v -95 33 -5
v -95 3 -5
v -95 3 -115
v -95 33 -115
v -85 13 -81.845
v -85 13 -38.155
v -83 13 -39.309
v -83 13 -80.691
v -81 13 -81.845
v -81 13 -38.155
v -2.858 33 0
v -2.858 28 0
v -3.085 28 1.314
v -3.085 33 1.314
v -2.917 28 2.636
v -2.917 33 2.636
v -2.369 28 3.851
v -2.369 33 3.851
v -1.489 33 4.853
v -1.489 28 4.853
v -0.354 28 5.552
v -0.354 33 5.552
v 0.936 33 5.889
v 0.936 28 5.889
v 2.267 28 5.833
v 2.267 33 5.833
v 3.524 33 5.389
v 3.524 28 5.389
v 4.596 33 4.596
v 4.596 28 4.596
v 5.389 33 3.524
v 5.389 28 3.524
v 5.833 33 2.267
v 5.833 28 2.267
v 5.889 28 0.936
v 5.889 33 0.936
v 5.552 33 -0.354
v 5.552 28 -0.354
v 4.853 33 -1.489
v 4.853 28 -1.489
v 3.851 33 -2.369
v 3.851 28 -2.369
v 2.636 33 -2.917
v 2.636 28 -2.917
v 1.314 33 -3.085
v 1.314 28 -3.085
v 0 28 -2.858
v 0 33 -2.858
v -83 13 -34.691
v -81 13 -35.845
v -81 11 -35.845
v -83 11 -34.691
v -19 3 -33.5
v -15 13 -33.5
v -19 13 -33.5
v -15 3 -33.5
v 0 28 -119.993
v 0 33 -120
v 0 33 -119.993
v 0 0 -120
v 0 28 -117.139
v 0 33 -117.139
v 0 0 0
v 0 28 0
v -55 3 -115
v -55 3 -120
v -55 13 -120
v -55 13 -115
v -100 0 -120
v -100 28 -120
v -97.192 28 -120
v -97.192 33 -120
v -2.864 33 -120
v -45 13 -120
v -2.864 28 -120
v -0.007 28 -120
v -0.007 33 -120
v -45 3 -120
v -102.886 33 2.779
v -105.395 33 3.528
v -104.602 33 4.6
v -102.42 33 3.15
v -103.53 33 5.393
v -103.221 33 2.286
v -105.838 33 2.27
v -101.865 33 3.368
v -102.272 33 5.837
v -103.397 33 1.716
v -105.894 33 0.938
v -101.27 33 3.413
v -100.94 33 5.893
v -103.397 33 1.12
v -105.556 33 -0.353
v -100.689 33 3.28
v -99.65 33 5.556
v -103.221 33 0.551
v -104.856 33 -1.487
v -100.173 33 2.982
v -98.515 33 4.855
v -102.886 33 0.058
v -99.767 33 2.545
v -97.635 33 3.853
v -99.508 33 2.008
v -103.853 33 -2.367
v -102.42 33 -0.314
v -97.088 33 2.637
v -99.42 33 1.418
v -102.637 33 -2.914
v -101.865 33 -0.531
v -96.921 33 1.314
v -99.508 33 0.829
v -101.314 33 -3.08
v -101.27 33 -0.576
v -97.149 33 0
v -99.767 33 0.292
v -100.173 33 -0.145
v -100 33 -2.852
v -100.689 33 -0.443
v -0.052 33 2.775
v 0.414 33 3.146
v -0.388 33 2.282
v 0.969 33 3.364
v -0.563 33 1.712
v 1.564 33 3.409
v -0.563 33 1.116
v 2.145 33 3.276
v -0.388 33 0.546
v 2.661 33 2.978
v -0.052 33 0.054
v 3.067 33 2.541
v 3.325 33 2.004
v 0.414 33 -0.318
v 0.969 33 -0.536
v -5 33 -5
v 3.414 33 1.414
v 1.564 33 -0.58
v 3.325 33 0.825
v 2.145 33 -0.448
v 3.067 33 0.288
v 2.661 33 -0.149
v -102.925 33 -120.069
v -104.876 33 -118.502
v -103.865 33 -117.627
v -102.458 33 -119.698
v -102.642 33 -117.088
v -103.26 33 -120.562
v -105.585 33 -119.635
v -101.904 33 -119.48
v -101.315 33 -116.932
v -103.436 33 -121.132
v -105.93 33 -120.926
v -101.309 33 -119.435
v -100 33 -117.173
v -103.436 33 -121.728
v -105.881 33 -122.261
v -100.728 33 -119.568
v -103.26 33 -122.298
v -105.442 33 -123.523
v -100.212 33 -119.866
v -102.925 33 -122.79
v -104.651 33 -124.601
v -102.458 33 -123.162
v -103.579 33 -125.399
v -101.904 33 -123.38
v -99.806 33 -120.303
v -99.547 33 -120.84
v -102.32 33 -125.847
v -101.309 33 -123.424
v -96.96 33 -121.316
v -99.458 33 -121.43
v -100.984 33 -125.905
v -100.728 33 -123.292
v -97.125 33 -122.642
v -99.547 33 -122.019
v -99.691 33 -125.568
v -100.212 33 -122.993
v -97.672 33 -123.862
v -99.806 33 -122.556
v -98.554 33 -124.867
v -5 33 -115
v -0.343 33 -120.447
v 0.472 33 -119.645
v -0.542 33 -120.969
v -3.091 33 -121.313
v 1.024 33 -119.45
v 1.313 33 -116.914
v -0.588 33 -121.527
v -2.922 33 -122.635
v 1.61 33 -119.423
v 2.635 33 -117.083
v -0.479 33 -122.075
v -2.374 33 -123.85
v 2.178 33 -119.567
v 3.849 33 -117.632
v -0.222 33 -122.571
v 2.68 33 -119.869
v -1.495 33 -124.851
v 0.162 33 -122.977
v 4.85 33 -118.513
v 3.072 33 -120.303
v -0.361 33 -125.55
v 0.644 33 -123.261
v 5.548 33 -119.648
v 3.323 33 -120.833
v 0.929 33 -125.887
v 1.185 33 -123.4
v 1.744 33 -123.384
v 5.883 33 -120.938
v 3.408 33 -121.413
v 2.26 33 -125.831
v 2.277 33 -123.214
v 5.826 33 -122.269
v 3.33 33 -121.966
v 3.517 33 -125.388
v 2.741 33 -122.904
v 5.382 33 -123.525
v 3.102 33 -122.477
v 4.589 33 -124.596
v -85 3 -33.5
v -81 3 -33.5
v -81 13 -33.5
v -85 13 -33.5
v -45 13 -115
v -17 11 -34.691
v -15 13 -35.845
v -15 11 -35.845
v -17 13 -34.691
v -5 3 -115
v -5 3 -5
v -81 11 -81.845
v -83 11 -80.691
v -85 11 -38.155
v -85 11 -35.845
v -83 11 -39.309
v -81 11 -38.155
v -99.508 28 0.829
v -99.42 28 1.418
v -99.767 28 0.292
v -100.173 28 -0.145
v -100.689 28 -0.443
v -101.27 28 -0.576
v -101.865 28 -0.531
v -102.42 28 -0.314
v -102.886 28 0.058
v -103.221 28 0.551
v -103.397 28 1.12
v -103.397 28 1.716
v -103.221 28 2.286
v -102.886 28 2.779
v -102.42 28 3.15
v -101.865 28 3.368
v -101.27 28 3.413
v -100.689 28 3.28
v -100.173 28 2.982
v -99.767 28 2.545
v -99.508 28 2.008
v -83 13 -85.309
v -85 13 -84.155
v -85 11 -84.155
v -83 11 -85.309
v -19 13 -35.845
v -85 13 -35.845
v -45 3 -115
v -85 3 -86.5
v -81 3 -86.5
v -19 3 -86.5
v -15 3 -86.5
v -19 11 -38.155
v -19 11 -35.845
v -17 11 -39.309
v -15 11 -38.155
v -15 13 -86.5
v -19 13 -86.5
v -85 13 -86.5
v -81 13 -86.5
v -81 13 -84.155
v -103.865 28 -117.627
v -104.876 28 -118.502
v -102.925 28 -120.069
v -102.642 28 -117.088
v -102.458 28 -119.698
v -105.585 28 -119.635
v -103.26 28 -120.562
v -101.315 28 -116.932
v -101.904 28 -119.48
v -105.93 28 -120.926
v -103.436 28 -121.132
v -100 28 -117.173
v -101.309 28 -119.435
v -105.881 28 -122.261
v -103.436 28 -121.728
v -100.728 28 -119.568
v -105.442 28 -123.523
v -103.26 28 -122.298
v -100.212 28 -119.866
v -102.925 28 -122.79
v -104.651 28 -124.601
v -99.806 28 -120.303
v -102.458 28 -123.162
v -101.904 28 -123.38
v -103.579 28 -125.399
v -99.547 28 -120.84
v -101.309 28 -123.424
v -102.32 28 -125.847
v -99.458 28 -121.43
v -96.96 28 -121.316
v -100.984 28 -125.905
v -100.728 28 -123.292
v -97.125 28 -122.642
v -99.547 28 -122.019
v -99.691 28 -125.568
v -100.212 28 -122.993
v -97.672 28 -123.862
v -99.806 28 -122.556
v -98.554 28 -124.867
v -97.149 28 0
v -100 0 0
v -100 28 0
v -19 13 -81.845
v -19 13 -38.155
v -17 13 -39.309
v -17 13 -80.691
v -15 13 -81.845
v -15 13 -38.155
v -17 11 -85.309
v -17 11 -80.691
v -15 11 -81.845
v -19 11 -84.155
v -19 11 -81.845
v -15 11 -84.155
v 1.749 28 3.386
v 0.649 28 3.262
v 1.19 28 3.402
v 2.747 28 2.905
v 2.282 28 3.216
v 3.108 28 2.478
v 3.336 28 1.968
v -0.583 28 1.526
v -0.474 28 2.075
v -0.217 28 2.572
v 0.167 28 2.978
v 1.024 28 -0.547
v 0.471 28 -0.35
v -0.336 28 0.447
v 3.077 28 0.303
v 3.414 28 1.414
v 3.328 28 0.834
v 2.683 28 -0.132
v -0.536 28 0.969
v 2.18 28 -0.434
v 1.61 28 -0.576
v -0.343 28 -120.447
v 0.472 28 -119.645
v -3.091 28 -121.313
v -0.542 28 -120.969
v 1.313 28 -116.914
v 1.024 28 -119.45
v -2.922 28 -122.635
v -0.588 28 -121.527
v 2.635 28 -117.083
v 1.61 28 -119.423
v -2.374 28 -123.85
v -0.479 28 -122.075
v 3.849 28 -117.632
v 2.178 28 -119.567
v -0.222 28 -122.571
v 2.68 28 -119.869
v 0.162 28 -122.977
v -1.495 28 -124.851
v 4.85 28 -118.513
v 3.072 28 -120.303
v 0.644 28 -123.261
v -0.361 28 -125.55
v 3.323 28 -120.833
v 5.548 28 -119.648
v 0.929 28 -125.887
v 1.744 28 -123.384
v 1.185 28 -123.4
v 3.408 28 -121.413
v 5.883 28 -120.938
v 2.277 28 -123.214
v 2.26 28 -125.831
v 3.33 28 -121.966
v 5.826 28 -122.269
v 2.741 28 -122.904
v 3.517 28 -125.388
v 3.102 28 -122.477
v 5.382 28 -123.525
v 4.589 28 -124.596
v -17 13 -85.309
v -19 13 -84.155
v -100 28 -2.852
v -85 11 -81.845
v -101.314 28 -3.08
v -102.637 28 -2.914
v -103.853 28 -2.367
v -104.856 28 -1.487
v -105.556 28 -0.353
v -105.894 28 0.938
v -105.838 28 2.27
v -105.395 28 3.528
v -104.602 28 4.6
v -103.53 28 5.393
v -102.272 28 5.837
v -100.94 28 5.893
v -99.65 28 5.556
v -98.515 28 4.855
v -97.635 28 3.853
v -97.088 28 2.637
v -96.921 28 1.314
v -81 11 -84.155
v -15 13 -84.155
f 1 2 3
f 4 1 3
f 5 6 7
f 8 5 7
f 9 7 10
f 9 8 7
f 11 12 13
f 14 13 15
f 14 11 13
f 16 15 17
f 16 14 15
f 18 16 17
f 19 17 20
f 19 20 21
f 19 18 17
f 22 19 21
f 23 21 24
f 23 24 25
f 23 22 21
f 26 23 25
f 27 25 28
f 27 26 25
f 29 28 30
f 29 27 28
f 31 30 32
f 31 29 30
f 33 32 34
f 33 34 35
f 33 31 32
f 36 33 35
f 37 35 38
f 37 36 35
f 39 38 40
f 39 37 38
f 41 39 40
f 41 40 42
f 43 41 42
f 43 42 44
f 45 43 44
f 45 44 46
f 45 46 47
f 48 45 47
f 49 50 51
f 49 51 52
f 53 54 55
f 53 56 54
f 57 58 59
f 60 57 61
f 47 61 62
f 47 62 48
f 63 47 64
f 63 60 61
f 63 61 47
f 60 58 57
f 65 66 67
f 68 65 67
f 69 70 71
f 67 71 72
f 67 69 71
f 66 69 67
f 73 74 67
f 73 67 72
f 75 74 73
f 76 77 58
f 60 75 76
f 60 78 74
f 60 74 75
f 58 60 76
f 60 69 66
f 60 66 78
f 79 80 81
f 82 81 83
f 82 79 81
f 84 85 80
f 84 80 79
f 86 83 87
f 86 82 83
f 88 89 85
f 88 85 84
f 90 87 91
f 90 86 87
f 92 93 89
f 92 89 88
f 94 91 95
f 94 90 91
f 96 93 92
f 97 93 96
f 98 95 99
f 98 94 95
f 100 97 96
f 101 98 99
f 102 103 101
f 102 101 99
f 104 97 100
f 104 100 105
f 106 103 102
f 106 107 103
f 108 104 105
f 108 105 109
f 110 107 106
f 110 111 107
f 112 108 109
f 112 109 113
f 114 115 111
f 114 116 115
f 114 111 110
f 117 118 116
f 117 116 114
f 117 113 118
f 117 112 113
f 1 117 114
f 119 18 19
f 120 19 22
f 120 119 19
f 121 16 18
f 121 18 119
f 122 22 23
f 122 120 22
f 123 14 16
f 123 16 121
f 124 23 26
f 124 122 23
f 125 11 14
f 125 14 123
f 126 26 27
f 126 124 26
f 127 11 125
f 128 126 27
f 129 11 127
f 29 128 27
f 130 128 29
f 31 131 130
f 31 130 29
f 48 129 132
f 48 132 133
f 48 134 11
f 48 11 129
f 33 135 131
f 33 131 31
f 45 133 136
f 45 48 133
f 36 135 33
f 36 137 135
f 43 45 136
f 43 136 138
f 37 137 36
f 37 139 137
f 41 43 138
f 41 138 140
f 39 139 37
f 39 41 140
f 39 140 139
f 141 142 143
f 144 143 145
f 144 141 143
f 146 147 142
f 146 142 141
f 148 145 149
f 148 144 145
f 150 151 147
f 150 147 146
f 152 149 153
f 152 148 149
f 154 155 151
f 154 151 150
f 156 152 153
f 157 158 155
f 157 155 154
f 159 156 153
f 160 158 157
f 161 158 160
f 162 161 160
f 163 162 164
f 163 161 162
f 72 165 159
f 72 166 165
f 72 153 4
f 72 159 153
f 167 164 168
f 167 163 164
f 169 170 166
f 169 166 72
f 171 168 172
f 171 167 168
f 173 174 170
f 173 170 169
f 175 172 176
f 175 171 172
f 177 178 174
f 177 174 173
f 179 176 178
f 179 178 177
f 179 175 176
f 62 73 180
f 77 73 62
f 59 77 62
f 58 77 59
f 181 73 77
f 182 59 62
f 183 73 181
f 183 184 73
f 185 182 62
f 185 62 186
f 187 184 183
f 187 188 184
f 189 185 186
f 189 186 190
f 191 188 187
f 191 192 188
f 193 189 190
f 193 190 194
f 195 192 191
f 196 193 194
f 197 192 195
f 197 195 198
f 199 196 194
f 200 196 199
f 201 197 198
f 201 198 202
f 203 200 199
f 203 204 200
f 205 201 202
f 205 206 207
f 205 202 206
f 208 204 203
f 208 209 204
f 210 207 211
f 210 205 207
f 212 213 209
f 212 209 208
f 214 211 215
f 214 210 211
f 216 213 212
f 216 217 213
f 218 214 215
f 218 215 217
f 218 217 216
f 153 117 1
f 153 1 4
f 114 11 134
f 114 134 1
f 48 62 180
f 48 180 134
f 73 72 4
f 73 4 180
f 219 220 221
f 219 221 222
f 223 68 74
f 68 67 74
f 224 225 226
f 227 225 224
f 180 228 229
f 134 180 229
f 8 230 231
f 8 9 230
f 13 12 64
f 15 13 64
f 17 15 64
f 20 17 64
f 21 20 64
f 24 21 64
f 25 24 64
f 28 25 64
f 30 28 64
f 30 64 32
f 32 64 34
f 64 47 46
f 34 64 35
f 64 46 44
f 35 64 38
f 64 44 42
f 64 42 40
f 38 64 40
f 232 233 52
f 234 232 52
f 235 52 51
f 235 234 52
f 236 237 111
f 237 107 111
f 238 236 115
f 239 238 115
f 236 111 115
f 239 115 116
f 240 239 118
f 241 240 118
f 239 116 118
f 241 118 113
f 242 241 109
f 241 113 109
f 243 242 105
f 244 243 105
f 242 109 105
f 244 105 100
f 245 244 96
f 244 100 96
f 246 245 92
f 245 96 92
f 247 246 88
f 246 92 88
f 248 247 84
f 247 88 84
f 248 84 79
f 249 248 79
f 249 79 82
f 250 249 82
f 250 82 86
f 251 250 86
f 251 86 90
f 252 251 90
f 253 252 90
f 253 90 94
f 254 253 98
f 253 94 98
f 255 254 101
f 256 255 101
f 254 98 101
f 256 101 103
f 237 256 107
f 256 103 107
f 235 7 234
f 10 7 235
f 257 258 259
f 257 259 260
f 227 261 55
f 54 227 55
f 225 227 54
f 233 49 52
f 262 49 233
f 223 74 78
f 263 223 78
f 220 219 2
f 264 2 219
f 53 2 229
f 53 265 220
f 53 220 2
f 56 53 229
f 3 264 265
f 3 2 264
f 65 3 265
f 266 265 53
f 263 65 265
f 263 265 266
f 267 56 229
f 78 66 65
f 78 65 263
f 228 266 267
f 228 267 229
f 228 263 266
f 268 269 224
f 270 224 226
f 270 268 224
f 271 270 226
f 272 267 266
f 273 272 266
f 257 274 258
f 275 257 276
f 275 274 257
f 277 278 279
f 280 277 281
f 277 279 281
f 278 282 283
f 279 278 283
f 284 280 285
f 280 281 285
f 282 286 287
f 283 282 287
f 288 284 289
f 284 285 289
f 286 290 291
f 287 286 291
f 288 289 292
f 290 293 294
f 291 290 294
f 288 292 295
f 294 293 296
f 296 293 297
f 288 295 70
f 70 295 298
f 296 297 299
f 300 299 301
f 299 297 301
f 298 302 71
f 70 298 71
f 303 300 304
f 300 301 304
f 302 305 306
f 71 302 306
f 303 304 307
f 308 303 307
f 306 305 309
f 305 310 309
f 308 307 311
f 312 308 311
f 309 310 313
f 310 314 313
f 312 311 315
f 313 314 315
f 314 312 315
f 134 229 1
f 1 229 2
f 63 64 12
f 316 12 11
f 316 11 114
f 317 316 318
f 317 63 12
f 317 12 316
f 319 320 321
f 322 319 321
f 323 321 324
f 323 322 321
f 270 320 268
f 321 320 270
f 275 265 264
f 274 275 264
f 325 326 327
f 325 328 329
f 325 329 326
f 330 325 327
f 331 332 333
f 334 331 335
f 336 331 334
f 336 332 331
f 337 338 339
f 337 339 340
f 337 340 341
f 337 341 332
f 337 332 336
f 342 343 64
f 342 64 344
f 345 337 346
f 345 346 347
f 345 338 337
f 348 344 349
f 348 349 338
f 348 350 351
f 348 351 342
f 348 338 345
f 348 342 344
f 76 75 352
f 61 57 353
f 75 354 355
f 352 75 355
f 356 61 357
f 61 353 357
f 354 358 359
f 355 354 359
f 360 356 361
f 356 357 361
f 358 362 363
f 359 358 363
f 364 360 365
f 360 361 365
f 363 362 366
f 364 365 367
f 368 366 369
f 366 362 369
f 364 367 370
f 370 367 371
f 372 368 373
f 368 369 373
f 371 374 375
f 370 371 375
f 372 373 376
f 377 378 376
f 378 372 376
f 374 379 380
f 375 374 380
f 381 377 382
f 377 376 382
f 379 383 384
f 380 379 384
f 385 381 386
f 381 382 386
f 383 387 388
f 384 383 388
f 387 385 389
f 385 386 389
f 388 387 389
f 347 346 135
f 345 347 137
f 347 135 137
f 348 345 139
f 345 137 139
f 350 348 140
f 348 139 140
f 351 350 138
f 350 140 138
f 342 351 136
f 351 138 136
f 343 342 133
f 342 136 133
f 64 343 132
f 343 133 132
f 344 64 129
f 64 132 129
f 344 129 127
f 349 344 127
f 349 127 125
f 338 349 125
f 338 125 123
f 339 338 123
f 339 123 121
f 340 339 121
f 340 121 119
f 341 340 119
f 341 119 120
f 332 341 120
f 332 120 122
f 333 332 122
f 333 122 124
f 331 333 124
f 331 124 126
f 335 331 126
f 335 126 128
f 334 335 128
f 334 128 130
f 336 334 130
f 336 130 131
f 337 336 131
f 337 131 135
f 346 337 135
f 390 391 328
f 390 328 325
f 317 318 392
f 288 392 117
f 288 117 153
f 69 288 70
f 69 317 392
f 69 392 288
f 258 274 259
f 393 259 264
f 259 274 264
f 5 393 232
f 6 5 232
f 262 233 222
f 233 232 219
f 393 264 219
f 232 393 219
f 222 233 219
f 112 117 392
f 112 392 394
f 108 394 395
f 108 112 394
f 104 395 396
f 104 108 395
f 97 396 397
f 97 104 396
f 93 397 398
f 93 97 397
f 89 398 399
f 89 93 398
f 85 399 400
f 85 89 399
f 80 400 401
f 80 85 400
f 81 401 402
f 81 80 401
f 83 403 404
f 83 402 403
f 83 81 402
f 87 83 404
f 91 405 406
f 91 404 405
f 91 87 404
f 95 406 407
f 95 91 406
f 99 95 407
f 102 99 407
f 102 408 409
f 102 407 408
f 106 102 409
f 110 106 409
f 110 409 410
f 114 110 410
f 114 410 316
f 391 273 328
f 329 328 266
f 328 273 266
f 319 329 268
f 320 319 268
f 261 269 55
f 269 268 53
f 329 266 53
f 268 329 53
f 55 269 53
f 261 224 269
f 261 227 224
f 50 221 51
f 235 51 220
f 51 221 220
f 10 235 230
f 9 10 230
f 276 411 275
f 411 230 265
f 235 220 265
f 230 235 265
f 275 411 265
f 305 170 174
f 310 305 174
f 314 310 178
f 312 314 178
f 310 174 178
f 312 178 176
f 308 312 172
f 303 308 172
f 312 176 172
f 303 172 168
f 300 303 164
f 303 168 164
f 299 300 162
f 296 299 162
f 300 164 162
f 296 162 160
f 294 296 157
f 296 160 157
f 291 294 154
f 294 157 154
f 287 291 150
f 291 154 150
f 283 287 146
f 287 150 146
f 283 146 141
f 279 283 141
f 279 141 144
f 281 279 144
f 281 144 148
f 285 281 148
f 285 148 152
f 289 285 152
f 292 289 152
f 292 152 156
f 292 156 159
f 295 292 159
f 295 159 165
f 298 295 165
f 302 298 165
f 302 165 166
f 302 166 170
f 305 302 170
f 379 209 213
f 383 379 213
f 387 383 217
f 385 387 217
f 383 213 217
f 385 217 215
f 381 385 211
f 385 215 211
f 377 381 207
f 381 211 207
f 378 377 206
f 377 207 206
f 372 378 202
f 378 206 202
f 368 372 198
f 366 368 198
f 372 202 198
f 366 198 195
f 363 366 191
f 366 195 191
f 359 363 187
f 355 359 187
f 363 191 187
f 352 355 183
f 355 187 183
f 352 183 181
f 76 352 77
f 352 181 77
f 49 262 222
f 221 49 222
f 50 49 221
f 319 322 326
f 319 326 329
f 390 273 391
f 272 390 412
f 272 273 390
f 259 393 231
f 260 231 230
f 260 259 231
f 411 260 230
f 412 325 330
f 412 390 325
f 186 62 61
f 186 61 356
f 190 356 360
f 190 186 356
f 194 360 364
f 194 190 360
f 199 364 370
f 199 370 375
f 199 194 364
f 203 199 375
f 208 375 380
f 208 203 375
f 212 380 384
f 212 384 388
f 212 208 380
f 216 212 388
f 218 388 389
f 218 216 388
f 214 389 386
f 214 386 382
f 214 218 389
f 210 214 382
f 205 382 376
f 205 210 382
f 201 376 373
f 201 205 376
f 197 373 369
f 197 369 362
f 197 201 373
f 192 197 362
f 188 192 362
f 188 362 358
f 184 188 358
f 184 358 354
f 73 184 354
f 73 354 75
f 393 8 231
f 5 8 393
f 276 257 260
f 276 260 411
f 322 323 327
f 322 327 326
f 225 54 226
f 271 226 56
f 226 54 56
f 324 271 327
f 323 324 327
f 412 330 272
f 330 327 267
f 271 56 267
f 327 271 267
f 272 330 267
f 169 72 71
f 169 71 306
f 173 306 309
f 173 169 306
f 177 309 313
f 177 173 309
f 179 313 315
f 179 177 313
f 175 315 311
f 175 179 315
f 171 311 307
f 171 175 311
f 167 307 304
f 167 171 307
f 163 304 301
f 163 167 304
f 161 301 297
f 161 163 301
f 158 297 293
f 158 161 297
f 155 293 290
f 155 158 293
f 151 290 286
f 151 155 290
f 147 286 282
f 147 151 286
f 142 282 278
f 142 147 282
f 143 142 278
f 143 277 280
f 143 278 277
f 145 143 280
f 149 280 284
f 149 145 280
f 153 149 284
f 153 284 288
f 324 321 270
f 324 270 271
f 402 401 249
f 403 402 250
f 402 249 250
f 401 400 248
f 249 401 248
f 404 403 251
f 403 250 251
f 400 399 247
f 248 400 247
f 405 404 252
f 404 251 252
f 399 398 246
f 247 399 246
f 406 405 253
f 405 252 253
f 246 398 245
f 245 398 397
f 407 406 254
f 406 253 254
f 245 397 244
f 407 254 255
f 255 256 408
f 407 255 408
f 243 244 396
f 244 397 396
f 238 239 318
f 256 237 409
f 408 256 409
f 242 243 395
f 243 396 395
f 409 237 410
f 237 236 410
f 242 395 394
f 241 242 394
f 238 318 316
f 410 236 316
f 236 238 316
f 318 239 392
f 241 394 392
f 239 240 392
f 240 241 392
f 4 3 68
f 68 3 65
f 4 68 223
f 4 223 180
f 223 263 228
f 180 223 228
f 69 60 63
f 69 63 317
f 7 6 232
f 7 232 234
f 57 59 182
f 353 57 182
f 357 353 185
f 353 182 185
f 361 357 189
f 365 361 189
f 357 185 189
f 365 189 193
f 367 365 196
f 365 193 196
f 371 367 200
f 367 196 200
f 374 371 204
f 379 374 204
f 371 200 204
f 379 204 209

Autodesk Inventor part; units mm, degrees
ref_plane "YZ Plane" through (0, 0, 0) normal (1, 0, 0) x (0, 1, 0)
ref_plane "XZ Plane" through (0, 0, 0) normal (0, 1, 0) x (-1, 0, 0)
ref_plane "XY Plane" through (0, 0, 0) normal (0, 0, 1) x (1, 0, 0)
sketch "Sketch2" plane through (0, 0, 0) normal (0, 1, 0) x (-1, 0, 0)
  line L0 (0, 0) -> (100, 0)
  line L1 (100, 0) -> (100, -120)
  line L2 (100, -120) -> (0, -120)
  line L3 (0, -120) -> (0, 0)
  dimension "d0" = 100
  dimension "d1" = 120
extrude "Extrusion1" add sketch "Sketch2" along normal blind 3
sketch "Sketch3" plane through (0, 3, 0) normal (0, 1, 0) x (1, 0, 0)
  line L0 (0, 120) -> (-100, 120) projected
  line L1 (-100, 120) -> (-100, 0) projected
  line L2 (-95, 115) -> (-5, 115)
  line L3 (-5, 115) -> (-5, 5)
  line L4 (-5, 5) -> (-95, 5)
  line L5 (-95, 5) -> (-95, 115)
  line L6 (-100, 120) -> (0, 120)
  line L7 (0, 120) -> (0, 0)
  line L8 (0, 0) -> (-100, 0)
  line L9 (-100, 0) -> (-100, 120)
  dimension "d6" = 90
  dimension "d7" = 110
extrude "Extrusion2" add sketch "Sketch3" along normal blind 30
sketch "Sketch4" plane through (0, 3, 0) normal (0, 1, 0) x (1, 0, 0)
  line L0 (-95, 115) -> (-95, 5) projected
  line L1 (-95, 115) -> (-95, 85)
  line L2 (-85, 85) -> (-15, 85)
  line L3 (-15, 85) -> (-15, 35)
  line L4 (-15, 35) -> (-85, 35)
  line L5 (-85, 35) -> (-85, 85)
  line L6 (-85, 85) -> (-81, 85)
  line L7 (-81, 85) -> (-81, 35)
  line L8 (-81, 35) -> (-85, 35)
  line L9 (-85, 35) -> (-85, 85)
  line L10 (-15, 85) -> (-19, 85)
  line L11 (-19, 85) -> (-19, 35)
  line L12 (-19, 35) -> (-15, 35)
  line L13 (-15, 35) -> (-15, 85)
  line L14 (-85, 85) -> (-81, 85)
  line L15 (-81, 85) -> (-81, 81)
  line L16 (-81, 81) -> (-85, 81)
  line L17 (-85, 81) -> (-85, 85)
  line L18 (-85, 35) -> (-81, 35)
  line L19 (-81, 35) -> (-81, 39)
  line L20 (-81, 39) -> (-85, 39)
  line L21 (-85, 39) -> (-85, 35)
  line L22 (-19, 35) -> (-15, 35)
  line L23 (-15, 35) -> (-15, 39)
  line L24 (-15, 39) -> (-19, 39)
  line L25 (-19, 39) -> (-19, 35)
  line L26 (-19, 85) -> (-15, 85)
  line L27 (-15, 85) -> (-15, 81)
  line L28 (-15, 81) -> (-19, 81)
  line L29 (-19, 81) -> (-19, 85)
  circle A0 centre (-83, 83) radius 1
  circle A1 centre (-83, 37) radius 1
  circle A2 centre (-17, 37) radius 1
  circle A3 centre (-17, 83) radius 1
  point P0 (0, 0)
  dimension "d12" = 70
  dimension "d13" = 50
  dimension "d14" = 4
  dimension "d15" = 4
  dimension "d16" = 4
  dimension "d17" = 4
  dimension "d18" = 2
  dimension "d19" = 2
  dimension "d20" = 2
sketch "Sketch5" plane through (0, 33, 0) normal (0, 1, 0) x (1, 0, 0)
  point P0 (0, 0)
sketch "Sketch6" plane through (0, 33, 0) normal (0, 1, 0) x (1, 0, 0)
  line L0 (-100, 0) -> (0, 0) projected
  line L1 (0, 0) -> (10, 0) construction
  circle A0 centre (1.4142, -1.4142) radius 2
  circle A1 centre (1.4142, -1.4142) radius 4.5
  circle A2 centre (1.4084, 121.4127) radius 2
  circle A3 centre (1.4084, 121.4127) radius 4.5
  circle A4 centre (-101.4585, 121.4298) radius 2
  circle A5 centre (-101.4585, 121.4298) radius 4.5
  circle A6 centre (-101.4195, -1.4184) radius 2
  circle A7 centre (-101.4195, -1.4184) radius 4.5
  dimension "d24" = 4
  dimension "d25" = 9
  dimension "d27" = 4
  dimension "d28" = 9
  dimension "d30" = 4
  dimension "d31" = 9
  dimension "d33" = 4
  dimension "d34" = 9
extrude "Extrusion3" add sketch "Sketch6" against normal blind 5
extrude "Extrusion4" add sketch "Sketch4" along normal blind 10 contours L16 L7 L20 L5 | L28 L3 L24 L11
sketch "Sketch7" plane through (0, 13, 0) normal (0, 1, 0) x (1, 0, 0)
  point P0 (0, 0)
sketch "Sketch10" plane through (0, 13, 0) normal (0, 1, 0) x (1, 0, 0)
  line L0 (-81, 81) -> (-85, 81) projected
  line L1 (-81, 39) -> (-81, 81) projected
  line L2 (-85, 81) -> (-81, 81)
  line L3 (-81, 81) -> (-81, 39)
  line L4 (-81, 39) -> (-85, 39)
  line L5 (-85, 39) -> (-85, 81)
  point P0 (0, 0)
sketch "Sketch11" plane through (0, 13, 0) normal (0, 1, 0) x (1, 0, 0)
  line L0 (-15, 81) -> (-19, 81) projected
  line L1 (-15, 39) -> (-15, 81) projected
  line L2 (-19, 81) -> (-15, 81)
  line L3 (-15, 81) -> (-15, 39)
  line L4 (-15, 39) -> (-19, 39)
  line L5 (-19, 39) -> (-19, 81)
  line L6 (-85, 81) -> (-81, 81) projected
  line L7 (-85, 81) -> (-81, 81)
  line L8 (-81, 81) -> (-81, 85)
  line L9 (-81, 85) -> (-85, 85)
  line L10 (-85, 85) -> (-85, 81)
  line L11 (-19, 39) -> (-19, 81) projected
  line L12 (-19, 81) -> (-15, 81)
  line L13 (-15, 81) -> (-15, 85)
  line L14 (-15, 85) -> (-19, 85)
  line L15 (-19, 85) -> (-19, 81)
  line L16 (-15, 39) -> (-19, 39) projected
  line L17 (-19, 39) -> (-15, 39)
  line L18 (-15, 39) -> (-15, 35)
  line L19 (-15, 35) -> (-19, 35)
  line L20 (-19, 35) -> (-19, 39)
  line L21 (-85, 39) -> (-81, 39)
  line L22 (-81, 39) -> (-81, 35)
  line L23 (-81, 35) -> (-85, 35)
  line L24 (-85, 35) -> (-85, 39)
  circle A0 centre (-83, 83) radius 1
  circle A1 centre (-17, 83) radius 1
  circle A2 centre (-17, 37) radius 1
  circle A3 centre (-83, 37) radius 1
  line L25 (-19, 84.1547) -> (-17, 85.3094)
  line L26 (-17, 85.3094) -> (-15, 84.1547)
  line L27 (-15, 84.1547) -> (-15, 81.8453)
  line L28 (-15, 81.8453) -> (-17, 80.6906)
  line L29 (-17, 80.6906) -> (-19, 81.8453)
  line L30 (-19, 81.8453) -> (-19, 84.1547)
  line L31 (-19, 38.1547) -> (-17, 39.3094)
  line L32 (-17, 39.3094) -> (-15, 38.1547)
  line L33 (-15, 38.1547) -> (-15, 35.8453)
  line L34 (-15, 35.8453) -> (-17, 34.6906)
  line L35 (-17, 34.6906) -> (-19, 35.8453)
  line L36 (-19, 35.8453) -> (-19, 38.1547)
  line L37 (-81, 35.8453) -> (-83, 34.6906)
  line L38 (-83, 34.6906) -> (-85, 35.8453)
  line L39 (-85, 35.8453) -> (-85, 38.1547)
  line L40 (-85, 38.1547) -> (-83, 39.3094)
  line L41 (-83, 39.3094) -> (-81, 38.1547)
  line L42 (-81, 38.1547) -> (-81, 35.8453)
  line L43 (-81, 81.8453) -> (-83, 80.6906)
  line L44 (-83, 80.6906) -> (-85, 81.8453)
  line L45 (-85, 81.8453) -> (-85, 84.1547)
  line L46 (-85, 84.1547) -> (-83, 85.3094)
  line L47 (-83, 85.3094) -> (-81, 84.1547)
  line L48 (-81, 84.1547) -> (-81, 81.8453)
  point P0 (0, 0)
  point P1 (-19, 83)
  point P2 (-19, 37)
  point P3 (-81, 37)
  point P4 (-81, 83)
  dimension "d75" = 4
  dimension "d76" = 4
  dimension "d77" = 2
  dimension "d78" = 2
  dimension "d79" = 2
sketch "Sketch17" plane through (0, 3, 0) normal (0, 1, 0) x (1, 0, 0)
  line L0 (-85, 85) -> (-15, 85)
  line L1 (-15, 85) -> (-15, 35)
  line L2 (-15, 35) -> (-85, 35)
  line L3 (-85, 35) -> (-85, 85)
  line L4 (-85, 85) -> (-81, 85)
  line L5 (-81, 85) -> (-81, 35)
  line L6 (-81, 35) -> (-85, 35)
  line L7 (-85, 35) -> (-85, 85)
  line L8 (-15, 85) -> (-19, 85)
  line L9 (-19, 85) -> (-19, 35)
  line L10 (-19, 35) -> (-15, 35)
  line L11 (-15, 35) -> (-15, 85)
  point P0 (0, 0)
  point P1 (-95, 115)
extrude "Extrusion7" add sketch "Sketch17" along normal blind 10 contours L0 L5 L2 L3 | L0 L1 L2 L9
sketch "Sketch18" plane through (0, 3, 0) normal (0, 1, 0) x (1, 0, 0)
  line L0 (-19, 35) -> (-19, 85) projected
  line L1 (-19, 35) -> (-15, 35)
  line L2 (-15, 35) -> (-15, 33.5)
  line L3 (-15, 33.5) -> (-19, 33.5)
  line L4 (-19, 33.5) -> (-19, 35)
  line L5 (-19, 85) -> (-15, 85)
  line L6 (-15, 85) -> (-15, 86.5)
  line L7 (-15, 86.5) -> (-19, 86.5)
  line L8 (-19, 86.5) -> (-19, 85)
  line L9 (-81, 85) -> (-85, 85) projected
  line L10 (-85, 85) -> (-81, 85)
  line L11 (-81, 85) -> (-81, 86.5)
  line L12 (-81, 86.5) -> (-85, 86.5)
  line L13 (-85, 86.5) -> (-85, 85)
  line L14 (-85, 35) -> (-81, 35) projected
  line L15 (-85, 35) -> (-81, 35)
  line L16 (-81, 35) -> (-81, 33.5)
  line L17 (-81, 33.5) -> (-85, 33.5)
  line L18 (-85, 33.5) -> (-85, 35)
  point P0 (0, 0)
  dimension "d80" = 4
  dimension "d81" = 1.5
  dimension "d82" = 1.5
extrude "Extrusion8" add sketch "Sketch18" along normal blind 10
extrude "Extrusion9" cut sketch "Sketch11" against normal blind 2 contours L28 L29 L0 | L0 L29 L15 L25 L14 L26 L13 L28 | L32 L18 L34 L19 L35 L20 L31 L4 | L4 L31 L32 | L14 L25 L26 | L34 L35 L19 | L44 L10 L46 L9 L47 L8 L43 L6 | L6 L43 L44 | L46 L47 L9 | L40 L41 L21 | L21 L41 L22 L37 L23 L38 L24 L40 | L23 L37 L38 | A0 | A1 | A2 | A3
sketch "Sketch19" plane through (0, 28, 0) normal (0, -1, 0) x (1, 0, 0)
  circle A0 centre (1.4142, 1.4142) radius 2 projected
  circle A1 centre (1.4142, 1.4142) radius 2
  circle A2 centre (1.4142, 1.4142) radius 4.5
  circle A3 centre (-101.4195, 1.4184) radius 2 projected
  circle A4 centre (-101.4195, 1.4184) radius 2
  circle A5 centre (-101.4195, 1.4184) radius 4.5
  circle A6 centre (-101.4585, -121.4298) radius 2 projected
  circle A7 centre (-101.4585, -121.4298) radius 2
  circle A8 centre (-101.4585, -121.4298) radius 4.5
  circle A9 centre (1.4142, -121.4298) radius 2.0171
  arc A10 (-0.0073, -120) -> (0, -119.9927) centre (1.4084, -121.4127) ccw projected
  circle A11 centre (1.4084, -121.4127) radius 4.5
  point P0 (0, 0)
sketch "Sketch20" plane through (0, 0, -120) normal (0, 0, -1) x (-1, 0, 0)
  line L0 (100, 28) -> (100, 33) projected
  line L1 (0, 0) -> (100, 0)
  line L2 (100, 0) -> (100, 33)
  line L3 (100, 33) -> (0, 33)
  line L4 (0, 33) -> (0, 0)
  line L5 (95, 3) -> (5, 3) projected
  line L6 (50, 3) -> (55, 3)
  line L7 (55, 3) -> (55, 13)
  line L8 (55, 13) -> (50, 13)
  line L9 (50, 13) -> (45, 13)
  line L10 (45, 13) -> (45, 3)
  line L11 (45, 3) -> (50, 3)
  line L12 (55, 13) -> (45, 13)
  line L13 (45, 13) -> (45, 3)
  line L14 (45, 3) -> (55, 3)
  line L15 (55, 3) -> (55, 13)
extrude "Extrusion10" cut sketch "Sketch20" against normal blind 10 contours L5 L10 L9 L8 L7
properties part number "Spod"
